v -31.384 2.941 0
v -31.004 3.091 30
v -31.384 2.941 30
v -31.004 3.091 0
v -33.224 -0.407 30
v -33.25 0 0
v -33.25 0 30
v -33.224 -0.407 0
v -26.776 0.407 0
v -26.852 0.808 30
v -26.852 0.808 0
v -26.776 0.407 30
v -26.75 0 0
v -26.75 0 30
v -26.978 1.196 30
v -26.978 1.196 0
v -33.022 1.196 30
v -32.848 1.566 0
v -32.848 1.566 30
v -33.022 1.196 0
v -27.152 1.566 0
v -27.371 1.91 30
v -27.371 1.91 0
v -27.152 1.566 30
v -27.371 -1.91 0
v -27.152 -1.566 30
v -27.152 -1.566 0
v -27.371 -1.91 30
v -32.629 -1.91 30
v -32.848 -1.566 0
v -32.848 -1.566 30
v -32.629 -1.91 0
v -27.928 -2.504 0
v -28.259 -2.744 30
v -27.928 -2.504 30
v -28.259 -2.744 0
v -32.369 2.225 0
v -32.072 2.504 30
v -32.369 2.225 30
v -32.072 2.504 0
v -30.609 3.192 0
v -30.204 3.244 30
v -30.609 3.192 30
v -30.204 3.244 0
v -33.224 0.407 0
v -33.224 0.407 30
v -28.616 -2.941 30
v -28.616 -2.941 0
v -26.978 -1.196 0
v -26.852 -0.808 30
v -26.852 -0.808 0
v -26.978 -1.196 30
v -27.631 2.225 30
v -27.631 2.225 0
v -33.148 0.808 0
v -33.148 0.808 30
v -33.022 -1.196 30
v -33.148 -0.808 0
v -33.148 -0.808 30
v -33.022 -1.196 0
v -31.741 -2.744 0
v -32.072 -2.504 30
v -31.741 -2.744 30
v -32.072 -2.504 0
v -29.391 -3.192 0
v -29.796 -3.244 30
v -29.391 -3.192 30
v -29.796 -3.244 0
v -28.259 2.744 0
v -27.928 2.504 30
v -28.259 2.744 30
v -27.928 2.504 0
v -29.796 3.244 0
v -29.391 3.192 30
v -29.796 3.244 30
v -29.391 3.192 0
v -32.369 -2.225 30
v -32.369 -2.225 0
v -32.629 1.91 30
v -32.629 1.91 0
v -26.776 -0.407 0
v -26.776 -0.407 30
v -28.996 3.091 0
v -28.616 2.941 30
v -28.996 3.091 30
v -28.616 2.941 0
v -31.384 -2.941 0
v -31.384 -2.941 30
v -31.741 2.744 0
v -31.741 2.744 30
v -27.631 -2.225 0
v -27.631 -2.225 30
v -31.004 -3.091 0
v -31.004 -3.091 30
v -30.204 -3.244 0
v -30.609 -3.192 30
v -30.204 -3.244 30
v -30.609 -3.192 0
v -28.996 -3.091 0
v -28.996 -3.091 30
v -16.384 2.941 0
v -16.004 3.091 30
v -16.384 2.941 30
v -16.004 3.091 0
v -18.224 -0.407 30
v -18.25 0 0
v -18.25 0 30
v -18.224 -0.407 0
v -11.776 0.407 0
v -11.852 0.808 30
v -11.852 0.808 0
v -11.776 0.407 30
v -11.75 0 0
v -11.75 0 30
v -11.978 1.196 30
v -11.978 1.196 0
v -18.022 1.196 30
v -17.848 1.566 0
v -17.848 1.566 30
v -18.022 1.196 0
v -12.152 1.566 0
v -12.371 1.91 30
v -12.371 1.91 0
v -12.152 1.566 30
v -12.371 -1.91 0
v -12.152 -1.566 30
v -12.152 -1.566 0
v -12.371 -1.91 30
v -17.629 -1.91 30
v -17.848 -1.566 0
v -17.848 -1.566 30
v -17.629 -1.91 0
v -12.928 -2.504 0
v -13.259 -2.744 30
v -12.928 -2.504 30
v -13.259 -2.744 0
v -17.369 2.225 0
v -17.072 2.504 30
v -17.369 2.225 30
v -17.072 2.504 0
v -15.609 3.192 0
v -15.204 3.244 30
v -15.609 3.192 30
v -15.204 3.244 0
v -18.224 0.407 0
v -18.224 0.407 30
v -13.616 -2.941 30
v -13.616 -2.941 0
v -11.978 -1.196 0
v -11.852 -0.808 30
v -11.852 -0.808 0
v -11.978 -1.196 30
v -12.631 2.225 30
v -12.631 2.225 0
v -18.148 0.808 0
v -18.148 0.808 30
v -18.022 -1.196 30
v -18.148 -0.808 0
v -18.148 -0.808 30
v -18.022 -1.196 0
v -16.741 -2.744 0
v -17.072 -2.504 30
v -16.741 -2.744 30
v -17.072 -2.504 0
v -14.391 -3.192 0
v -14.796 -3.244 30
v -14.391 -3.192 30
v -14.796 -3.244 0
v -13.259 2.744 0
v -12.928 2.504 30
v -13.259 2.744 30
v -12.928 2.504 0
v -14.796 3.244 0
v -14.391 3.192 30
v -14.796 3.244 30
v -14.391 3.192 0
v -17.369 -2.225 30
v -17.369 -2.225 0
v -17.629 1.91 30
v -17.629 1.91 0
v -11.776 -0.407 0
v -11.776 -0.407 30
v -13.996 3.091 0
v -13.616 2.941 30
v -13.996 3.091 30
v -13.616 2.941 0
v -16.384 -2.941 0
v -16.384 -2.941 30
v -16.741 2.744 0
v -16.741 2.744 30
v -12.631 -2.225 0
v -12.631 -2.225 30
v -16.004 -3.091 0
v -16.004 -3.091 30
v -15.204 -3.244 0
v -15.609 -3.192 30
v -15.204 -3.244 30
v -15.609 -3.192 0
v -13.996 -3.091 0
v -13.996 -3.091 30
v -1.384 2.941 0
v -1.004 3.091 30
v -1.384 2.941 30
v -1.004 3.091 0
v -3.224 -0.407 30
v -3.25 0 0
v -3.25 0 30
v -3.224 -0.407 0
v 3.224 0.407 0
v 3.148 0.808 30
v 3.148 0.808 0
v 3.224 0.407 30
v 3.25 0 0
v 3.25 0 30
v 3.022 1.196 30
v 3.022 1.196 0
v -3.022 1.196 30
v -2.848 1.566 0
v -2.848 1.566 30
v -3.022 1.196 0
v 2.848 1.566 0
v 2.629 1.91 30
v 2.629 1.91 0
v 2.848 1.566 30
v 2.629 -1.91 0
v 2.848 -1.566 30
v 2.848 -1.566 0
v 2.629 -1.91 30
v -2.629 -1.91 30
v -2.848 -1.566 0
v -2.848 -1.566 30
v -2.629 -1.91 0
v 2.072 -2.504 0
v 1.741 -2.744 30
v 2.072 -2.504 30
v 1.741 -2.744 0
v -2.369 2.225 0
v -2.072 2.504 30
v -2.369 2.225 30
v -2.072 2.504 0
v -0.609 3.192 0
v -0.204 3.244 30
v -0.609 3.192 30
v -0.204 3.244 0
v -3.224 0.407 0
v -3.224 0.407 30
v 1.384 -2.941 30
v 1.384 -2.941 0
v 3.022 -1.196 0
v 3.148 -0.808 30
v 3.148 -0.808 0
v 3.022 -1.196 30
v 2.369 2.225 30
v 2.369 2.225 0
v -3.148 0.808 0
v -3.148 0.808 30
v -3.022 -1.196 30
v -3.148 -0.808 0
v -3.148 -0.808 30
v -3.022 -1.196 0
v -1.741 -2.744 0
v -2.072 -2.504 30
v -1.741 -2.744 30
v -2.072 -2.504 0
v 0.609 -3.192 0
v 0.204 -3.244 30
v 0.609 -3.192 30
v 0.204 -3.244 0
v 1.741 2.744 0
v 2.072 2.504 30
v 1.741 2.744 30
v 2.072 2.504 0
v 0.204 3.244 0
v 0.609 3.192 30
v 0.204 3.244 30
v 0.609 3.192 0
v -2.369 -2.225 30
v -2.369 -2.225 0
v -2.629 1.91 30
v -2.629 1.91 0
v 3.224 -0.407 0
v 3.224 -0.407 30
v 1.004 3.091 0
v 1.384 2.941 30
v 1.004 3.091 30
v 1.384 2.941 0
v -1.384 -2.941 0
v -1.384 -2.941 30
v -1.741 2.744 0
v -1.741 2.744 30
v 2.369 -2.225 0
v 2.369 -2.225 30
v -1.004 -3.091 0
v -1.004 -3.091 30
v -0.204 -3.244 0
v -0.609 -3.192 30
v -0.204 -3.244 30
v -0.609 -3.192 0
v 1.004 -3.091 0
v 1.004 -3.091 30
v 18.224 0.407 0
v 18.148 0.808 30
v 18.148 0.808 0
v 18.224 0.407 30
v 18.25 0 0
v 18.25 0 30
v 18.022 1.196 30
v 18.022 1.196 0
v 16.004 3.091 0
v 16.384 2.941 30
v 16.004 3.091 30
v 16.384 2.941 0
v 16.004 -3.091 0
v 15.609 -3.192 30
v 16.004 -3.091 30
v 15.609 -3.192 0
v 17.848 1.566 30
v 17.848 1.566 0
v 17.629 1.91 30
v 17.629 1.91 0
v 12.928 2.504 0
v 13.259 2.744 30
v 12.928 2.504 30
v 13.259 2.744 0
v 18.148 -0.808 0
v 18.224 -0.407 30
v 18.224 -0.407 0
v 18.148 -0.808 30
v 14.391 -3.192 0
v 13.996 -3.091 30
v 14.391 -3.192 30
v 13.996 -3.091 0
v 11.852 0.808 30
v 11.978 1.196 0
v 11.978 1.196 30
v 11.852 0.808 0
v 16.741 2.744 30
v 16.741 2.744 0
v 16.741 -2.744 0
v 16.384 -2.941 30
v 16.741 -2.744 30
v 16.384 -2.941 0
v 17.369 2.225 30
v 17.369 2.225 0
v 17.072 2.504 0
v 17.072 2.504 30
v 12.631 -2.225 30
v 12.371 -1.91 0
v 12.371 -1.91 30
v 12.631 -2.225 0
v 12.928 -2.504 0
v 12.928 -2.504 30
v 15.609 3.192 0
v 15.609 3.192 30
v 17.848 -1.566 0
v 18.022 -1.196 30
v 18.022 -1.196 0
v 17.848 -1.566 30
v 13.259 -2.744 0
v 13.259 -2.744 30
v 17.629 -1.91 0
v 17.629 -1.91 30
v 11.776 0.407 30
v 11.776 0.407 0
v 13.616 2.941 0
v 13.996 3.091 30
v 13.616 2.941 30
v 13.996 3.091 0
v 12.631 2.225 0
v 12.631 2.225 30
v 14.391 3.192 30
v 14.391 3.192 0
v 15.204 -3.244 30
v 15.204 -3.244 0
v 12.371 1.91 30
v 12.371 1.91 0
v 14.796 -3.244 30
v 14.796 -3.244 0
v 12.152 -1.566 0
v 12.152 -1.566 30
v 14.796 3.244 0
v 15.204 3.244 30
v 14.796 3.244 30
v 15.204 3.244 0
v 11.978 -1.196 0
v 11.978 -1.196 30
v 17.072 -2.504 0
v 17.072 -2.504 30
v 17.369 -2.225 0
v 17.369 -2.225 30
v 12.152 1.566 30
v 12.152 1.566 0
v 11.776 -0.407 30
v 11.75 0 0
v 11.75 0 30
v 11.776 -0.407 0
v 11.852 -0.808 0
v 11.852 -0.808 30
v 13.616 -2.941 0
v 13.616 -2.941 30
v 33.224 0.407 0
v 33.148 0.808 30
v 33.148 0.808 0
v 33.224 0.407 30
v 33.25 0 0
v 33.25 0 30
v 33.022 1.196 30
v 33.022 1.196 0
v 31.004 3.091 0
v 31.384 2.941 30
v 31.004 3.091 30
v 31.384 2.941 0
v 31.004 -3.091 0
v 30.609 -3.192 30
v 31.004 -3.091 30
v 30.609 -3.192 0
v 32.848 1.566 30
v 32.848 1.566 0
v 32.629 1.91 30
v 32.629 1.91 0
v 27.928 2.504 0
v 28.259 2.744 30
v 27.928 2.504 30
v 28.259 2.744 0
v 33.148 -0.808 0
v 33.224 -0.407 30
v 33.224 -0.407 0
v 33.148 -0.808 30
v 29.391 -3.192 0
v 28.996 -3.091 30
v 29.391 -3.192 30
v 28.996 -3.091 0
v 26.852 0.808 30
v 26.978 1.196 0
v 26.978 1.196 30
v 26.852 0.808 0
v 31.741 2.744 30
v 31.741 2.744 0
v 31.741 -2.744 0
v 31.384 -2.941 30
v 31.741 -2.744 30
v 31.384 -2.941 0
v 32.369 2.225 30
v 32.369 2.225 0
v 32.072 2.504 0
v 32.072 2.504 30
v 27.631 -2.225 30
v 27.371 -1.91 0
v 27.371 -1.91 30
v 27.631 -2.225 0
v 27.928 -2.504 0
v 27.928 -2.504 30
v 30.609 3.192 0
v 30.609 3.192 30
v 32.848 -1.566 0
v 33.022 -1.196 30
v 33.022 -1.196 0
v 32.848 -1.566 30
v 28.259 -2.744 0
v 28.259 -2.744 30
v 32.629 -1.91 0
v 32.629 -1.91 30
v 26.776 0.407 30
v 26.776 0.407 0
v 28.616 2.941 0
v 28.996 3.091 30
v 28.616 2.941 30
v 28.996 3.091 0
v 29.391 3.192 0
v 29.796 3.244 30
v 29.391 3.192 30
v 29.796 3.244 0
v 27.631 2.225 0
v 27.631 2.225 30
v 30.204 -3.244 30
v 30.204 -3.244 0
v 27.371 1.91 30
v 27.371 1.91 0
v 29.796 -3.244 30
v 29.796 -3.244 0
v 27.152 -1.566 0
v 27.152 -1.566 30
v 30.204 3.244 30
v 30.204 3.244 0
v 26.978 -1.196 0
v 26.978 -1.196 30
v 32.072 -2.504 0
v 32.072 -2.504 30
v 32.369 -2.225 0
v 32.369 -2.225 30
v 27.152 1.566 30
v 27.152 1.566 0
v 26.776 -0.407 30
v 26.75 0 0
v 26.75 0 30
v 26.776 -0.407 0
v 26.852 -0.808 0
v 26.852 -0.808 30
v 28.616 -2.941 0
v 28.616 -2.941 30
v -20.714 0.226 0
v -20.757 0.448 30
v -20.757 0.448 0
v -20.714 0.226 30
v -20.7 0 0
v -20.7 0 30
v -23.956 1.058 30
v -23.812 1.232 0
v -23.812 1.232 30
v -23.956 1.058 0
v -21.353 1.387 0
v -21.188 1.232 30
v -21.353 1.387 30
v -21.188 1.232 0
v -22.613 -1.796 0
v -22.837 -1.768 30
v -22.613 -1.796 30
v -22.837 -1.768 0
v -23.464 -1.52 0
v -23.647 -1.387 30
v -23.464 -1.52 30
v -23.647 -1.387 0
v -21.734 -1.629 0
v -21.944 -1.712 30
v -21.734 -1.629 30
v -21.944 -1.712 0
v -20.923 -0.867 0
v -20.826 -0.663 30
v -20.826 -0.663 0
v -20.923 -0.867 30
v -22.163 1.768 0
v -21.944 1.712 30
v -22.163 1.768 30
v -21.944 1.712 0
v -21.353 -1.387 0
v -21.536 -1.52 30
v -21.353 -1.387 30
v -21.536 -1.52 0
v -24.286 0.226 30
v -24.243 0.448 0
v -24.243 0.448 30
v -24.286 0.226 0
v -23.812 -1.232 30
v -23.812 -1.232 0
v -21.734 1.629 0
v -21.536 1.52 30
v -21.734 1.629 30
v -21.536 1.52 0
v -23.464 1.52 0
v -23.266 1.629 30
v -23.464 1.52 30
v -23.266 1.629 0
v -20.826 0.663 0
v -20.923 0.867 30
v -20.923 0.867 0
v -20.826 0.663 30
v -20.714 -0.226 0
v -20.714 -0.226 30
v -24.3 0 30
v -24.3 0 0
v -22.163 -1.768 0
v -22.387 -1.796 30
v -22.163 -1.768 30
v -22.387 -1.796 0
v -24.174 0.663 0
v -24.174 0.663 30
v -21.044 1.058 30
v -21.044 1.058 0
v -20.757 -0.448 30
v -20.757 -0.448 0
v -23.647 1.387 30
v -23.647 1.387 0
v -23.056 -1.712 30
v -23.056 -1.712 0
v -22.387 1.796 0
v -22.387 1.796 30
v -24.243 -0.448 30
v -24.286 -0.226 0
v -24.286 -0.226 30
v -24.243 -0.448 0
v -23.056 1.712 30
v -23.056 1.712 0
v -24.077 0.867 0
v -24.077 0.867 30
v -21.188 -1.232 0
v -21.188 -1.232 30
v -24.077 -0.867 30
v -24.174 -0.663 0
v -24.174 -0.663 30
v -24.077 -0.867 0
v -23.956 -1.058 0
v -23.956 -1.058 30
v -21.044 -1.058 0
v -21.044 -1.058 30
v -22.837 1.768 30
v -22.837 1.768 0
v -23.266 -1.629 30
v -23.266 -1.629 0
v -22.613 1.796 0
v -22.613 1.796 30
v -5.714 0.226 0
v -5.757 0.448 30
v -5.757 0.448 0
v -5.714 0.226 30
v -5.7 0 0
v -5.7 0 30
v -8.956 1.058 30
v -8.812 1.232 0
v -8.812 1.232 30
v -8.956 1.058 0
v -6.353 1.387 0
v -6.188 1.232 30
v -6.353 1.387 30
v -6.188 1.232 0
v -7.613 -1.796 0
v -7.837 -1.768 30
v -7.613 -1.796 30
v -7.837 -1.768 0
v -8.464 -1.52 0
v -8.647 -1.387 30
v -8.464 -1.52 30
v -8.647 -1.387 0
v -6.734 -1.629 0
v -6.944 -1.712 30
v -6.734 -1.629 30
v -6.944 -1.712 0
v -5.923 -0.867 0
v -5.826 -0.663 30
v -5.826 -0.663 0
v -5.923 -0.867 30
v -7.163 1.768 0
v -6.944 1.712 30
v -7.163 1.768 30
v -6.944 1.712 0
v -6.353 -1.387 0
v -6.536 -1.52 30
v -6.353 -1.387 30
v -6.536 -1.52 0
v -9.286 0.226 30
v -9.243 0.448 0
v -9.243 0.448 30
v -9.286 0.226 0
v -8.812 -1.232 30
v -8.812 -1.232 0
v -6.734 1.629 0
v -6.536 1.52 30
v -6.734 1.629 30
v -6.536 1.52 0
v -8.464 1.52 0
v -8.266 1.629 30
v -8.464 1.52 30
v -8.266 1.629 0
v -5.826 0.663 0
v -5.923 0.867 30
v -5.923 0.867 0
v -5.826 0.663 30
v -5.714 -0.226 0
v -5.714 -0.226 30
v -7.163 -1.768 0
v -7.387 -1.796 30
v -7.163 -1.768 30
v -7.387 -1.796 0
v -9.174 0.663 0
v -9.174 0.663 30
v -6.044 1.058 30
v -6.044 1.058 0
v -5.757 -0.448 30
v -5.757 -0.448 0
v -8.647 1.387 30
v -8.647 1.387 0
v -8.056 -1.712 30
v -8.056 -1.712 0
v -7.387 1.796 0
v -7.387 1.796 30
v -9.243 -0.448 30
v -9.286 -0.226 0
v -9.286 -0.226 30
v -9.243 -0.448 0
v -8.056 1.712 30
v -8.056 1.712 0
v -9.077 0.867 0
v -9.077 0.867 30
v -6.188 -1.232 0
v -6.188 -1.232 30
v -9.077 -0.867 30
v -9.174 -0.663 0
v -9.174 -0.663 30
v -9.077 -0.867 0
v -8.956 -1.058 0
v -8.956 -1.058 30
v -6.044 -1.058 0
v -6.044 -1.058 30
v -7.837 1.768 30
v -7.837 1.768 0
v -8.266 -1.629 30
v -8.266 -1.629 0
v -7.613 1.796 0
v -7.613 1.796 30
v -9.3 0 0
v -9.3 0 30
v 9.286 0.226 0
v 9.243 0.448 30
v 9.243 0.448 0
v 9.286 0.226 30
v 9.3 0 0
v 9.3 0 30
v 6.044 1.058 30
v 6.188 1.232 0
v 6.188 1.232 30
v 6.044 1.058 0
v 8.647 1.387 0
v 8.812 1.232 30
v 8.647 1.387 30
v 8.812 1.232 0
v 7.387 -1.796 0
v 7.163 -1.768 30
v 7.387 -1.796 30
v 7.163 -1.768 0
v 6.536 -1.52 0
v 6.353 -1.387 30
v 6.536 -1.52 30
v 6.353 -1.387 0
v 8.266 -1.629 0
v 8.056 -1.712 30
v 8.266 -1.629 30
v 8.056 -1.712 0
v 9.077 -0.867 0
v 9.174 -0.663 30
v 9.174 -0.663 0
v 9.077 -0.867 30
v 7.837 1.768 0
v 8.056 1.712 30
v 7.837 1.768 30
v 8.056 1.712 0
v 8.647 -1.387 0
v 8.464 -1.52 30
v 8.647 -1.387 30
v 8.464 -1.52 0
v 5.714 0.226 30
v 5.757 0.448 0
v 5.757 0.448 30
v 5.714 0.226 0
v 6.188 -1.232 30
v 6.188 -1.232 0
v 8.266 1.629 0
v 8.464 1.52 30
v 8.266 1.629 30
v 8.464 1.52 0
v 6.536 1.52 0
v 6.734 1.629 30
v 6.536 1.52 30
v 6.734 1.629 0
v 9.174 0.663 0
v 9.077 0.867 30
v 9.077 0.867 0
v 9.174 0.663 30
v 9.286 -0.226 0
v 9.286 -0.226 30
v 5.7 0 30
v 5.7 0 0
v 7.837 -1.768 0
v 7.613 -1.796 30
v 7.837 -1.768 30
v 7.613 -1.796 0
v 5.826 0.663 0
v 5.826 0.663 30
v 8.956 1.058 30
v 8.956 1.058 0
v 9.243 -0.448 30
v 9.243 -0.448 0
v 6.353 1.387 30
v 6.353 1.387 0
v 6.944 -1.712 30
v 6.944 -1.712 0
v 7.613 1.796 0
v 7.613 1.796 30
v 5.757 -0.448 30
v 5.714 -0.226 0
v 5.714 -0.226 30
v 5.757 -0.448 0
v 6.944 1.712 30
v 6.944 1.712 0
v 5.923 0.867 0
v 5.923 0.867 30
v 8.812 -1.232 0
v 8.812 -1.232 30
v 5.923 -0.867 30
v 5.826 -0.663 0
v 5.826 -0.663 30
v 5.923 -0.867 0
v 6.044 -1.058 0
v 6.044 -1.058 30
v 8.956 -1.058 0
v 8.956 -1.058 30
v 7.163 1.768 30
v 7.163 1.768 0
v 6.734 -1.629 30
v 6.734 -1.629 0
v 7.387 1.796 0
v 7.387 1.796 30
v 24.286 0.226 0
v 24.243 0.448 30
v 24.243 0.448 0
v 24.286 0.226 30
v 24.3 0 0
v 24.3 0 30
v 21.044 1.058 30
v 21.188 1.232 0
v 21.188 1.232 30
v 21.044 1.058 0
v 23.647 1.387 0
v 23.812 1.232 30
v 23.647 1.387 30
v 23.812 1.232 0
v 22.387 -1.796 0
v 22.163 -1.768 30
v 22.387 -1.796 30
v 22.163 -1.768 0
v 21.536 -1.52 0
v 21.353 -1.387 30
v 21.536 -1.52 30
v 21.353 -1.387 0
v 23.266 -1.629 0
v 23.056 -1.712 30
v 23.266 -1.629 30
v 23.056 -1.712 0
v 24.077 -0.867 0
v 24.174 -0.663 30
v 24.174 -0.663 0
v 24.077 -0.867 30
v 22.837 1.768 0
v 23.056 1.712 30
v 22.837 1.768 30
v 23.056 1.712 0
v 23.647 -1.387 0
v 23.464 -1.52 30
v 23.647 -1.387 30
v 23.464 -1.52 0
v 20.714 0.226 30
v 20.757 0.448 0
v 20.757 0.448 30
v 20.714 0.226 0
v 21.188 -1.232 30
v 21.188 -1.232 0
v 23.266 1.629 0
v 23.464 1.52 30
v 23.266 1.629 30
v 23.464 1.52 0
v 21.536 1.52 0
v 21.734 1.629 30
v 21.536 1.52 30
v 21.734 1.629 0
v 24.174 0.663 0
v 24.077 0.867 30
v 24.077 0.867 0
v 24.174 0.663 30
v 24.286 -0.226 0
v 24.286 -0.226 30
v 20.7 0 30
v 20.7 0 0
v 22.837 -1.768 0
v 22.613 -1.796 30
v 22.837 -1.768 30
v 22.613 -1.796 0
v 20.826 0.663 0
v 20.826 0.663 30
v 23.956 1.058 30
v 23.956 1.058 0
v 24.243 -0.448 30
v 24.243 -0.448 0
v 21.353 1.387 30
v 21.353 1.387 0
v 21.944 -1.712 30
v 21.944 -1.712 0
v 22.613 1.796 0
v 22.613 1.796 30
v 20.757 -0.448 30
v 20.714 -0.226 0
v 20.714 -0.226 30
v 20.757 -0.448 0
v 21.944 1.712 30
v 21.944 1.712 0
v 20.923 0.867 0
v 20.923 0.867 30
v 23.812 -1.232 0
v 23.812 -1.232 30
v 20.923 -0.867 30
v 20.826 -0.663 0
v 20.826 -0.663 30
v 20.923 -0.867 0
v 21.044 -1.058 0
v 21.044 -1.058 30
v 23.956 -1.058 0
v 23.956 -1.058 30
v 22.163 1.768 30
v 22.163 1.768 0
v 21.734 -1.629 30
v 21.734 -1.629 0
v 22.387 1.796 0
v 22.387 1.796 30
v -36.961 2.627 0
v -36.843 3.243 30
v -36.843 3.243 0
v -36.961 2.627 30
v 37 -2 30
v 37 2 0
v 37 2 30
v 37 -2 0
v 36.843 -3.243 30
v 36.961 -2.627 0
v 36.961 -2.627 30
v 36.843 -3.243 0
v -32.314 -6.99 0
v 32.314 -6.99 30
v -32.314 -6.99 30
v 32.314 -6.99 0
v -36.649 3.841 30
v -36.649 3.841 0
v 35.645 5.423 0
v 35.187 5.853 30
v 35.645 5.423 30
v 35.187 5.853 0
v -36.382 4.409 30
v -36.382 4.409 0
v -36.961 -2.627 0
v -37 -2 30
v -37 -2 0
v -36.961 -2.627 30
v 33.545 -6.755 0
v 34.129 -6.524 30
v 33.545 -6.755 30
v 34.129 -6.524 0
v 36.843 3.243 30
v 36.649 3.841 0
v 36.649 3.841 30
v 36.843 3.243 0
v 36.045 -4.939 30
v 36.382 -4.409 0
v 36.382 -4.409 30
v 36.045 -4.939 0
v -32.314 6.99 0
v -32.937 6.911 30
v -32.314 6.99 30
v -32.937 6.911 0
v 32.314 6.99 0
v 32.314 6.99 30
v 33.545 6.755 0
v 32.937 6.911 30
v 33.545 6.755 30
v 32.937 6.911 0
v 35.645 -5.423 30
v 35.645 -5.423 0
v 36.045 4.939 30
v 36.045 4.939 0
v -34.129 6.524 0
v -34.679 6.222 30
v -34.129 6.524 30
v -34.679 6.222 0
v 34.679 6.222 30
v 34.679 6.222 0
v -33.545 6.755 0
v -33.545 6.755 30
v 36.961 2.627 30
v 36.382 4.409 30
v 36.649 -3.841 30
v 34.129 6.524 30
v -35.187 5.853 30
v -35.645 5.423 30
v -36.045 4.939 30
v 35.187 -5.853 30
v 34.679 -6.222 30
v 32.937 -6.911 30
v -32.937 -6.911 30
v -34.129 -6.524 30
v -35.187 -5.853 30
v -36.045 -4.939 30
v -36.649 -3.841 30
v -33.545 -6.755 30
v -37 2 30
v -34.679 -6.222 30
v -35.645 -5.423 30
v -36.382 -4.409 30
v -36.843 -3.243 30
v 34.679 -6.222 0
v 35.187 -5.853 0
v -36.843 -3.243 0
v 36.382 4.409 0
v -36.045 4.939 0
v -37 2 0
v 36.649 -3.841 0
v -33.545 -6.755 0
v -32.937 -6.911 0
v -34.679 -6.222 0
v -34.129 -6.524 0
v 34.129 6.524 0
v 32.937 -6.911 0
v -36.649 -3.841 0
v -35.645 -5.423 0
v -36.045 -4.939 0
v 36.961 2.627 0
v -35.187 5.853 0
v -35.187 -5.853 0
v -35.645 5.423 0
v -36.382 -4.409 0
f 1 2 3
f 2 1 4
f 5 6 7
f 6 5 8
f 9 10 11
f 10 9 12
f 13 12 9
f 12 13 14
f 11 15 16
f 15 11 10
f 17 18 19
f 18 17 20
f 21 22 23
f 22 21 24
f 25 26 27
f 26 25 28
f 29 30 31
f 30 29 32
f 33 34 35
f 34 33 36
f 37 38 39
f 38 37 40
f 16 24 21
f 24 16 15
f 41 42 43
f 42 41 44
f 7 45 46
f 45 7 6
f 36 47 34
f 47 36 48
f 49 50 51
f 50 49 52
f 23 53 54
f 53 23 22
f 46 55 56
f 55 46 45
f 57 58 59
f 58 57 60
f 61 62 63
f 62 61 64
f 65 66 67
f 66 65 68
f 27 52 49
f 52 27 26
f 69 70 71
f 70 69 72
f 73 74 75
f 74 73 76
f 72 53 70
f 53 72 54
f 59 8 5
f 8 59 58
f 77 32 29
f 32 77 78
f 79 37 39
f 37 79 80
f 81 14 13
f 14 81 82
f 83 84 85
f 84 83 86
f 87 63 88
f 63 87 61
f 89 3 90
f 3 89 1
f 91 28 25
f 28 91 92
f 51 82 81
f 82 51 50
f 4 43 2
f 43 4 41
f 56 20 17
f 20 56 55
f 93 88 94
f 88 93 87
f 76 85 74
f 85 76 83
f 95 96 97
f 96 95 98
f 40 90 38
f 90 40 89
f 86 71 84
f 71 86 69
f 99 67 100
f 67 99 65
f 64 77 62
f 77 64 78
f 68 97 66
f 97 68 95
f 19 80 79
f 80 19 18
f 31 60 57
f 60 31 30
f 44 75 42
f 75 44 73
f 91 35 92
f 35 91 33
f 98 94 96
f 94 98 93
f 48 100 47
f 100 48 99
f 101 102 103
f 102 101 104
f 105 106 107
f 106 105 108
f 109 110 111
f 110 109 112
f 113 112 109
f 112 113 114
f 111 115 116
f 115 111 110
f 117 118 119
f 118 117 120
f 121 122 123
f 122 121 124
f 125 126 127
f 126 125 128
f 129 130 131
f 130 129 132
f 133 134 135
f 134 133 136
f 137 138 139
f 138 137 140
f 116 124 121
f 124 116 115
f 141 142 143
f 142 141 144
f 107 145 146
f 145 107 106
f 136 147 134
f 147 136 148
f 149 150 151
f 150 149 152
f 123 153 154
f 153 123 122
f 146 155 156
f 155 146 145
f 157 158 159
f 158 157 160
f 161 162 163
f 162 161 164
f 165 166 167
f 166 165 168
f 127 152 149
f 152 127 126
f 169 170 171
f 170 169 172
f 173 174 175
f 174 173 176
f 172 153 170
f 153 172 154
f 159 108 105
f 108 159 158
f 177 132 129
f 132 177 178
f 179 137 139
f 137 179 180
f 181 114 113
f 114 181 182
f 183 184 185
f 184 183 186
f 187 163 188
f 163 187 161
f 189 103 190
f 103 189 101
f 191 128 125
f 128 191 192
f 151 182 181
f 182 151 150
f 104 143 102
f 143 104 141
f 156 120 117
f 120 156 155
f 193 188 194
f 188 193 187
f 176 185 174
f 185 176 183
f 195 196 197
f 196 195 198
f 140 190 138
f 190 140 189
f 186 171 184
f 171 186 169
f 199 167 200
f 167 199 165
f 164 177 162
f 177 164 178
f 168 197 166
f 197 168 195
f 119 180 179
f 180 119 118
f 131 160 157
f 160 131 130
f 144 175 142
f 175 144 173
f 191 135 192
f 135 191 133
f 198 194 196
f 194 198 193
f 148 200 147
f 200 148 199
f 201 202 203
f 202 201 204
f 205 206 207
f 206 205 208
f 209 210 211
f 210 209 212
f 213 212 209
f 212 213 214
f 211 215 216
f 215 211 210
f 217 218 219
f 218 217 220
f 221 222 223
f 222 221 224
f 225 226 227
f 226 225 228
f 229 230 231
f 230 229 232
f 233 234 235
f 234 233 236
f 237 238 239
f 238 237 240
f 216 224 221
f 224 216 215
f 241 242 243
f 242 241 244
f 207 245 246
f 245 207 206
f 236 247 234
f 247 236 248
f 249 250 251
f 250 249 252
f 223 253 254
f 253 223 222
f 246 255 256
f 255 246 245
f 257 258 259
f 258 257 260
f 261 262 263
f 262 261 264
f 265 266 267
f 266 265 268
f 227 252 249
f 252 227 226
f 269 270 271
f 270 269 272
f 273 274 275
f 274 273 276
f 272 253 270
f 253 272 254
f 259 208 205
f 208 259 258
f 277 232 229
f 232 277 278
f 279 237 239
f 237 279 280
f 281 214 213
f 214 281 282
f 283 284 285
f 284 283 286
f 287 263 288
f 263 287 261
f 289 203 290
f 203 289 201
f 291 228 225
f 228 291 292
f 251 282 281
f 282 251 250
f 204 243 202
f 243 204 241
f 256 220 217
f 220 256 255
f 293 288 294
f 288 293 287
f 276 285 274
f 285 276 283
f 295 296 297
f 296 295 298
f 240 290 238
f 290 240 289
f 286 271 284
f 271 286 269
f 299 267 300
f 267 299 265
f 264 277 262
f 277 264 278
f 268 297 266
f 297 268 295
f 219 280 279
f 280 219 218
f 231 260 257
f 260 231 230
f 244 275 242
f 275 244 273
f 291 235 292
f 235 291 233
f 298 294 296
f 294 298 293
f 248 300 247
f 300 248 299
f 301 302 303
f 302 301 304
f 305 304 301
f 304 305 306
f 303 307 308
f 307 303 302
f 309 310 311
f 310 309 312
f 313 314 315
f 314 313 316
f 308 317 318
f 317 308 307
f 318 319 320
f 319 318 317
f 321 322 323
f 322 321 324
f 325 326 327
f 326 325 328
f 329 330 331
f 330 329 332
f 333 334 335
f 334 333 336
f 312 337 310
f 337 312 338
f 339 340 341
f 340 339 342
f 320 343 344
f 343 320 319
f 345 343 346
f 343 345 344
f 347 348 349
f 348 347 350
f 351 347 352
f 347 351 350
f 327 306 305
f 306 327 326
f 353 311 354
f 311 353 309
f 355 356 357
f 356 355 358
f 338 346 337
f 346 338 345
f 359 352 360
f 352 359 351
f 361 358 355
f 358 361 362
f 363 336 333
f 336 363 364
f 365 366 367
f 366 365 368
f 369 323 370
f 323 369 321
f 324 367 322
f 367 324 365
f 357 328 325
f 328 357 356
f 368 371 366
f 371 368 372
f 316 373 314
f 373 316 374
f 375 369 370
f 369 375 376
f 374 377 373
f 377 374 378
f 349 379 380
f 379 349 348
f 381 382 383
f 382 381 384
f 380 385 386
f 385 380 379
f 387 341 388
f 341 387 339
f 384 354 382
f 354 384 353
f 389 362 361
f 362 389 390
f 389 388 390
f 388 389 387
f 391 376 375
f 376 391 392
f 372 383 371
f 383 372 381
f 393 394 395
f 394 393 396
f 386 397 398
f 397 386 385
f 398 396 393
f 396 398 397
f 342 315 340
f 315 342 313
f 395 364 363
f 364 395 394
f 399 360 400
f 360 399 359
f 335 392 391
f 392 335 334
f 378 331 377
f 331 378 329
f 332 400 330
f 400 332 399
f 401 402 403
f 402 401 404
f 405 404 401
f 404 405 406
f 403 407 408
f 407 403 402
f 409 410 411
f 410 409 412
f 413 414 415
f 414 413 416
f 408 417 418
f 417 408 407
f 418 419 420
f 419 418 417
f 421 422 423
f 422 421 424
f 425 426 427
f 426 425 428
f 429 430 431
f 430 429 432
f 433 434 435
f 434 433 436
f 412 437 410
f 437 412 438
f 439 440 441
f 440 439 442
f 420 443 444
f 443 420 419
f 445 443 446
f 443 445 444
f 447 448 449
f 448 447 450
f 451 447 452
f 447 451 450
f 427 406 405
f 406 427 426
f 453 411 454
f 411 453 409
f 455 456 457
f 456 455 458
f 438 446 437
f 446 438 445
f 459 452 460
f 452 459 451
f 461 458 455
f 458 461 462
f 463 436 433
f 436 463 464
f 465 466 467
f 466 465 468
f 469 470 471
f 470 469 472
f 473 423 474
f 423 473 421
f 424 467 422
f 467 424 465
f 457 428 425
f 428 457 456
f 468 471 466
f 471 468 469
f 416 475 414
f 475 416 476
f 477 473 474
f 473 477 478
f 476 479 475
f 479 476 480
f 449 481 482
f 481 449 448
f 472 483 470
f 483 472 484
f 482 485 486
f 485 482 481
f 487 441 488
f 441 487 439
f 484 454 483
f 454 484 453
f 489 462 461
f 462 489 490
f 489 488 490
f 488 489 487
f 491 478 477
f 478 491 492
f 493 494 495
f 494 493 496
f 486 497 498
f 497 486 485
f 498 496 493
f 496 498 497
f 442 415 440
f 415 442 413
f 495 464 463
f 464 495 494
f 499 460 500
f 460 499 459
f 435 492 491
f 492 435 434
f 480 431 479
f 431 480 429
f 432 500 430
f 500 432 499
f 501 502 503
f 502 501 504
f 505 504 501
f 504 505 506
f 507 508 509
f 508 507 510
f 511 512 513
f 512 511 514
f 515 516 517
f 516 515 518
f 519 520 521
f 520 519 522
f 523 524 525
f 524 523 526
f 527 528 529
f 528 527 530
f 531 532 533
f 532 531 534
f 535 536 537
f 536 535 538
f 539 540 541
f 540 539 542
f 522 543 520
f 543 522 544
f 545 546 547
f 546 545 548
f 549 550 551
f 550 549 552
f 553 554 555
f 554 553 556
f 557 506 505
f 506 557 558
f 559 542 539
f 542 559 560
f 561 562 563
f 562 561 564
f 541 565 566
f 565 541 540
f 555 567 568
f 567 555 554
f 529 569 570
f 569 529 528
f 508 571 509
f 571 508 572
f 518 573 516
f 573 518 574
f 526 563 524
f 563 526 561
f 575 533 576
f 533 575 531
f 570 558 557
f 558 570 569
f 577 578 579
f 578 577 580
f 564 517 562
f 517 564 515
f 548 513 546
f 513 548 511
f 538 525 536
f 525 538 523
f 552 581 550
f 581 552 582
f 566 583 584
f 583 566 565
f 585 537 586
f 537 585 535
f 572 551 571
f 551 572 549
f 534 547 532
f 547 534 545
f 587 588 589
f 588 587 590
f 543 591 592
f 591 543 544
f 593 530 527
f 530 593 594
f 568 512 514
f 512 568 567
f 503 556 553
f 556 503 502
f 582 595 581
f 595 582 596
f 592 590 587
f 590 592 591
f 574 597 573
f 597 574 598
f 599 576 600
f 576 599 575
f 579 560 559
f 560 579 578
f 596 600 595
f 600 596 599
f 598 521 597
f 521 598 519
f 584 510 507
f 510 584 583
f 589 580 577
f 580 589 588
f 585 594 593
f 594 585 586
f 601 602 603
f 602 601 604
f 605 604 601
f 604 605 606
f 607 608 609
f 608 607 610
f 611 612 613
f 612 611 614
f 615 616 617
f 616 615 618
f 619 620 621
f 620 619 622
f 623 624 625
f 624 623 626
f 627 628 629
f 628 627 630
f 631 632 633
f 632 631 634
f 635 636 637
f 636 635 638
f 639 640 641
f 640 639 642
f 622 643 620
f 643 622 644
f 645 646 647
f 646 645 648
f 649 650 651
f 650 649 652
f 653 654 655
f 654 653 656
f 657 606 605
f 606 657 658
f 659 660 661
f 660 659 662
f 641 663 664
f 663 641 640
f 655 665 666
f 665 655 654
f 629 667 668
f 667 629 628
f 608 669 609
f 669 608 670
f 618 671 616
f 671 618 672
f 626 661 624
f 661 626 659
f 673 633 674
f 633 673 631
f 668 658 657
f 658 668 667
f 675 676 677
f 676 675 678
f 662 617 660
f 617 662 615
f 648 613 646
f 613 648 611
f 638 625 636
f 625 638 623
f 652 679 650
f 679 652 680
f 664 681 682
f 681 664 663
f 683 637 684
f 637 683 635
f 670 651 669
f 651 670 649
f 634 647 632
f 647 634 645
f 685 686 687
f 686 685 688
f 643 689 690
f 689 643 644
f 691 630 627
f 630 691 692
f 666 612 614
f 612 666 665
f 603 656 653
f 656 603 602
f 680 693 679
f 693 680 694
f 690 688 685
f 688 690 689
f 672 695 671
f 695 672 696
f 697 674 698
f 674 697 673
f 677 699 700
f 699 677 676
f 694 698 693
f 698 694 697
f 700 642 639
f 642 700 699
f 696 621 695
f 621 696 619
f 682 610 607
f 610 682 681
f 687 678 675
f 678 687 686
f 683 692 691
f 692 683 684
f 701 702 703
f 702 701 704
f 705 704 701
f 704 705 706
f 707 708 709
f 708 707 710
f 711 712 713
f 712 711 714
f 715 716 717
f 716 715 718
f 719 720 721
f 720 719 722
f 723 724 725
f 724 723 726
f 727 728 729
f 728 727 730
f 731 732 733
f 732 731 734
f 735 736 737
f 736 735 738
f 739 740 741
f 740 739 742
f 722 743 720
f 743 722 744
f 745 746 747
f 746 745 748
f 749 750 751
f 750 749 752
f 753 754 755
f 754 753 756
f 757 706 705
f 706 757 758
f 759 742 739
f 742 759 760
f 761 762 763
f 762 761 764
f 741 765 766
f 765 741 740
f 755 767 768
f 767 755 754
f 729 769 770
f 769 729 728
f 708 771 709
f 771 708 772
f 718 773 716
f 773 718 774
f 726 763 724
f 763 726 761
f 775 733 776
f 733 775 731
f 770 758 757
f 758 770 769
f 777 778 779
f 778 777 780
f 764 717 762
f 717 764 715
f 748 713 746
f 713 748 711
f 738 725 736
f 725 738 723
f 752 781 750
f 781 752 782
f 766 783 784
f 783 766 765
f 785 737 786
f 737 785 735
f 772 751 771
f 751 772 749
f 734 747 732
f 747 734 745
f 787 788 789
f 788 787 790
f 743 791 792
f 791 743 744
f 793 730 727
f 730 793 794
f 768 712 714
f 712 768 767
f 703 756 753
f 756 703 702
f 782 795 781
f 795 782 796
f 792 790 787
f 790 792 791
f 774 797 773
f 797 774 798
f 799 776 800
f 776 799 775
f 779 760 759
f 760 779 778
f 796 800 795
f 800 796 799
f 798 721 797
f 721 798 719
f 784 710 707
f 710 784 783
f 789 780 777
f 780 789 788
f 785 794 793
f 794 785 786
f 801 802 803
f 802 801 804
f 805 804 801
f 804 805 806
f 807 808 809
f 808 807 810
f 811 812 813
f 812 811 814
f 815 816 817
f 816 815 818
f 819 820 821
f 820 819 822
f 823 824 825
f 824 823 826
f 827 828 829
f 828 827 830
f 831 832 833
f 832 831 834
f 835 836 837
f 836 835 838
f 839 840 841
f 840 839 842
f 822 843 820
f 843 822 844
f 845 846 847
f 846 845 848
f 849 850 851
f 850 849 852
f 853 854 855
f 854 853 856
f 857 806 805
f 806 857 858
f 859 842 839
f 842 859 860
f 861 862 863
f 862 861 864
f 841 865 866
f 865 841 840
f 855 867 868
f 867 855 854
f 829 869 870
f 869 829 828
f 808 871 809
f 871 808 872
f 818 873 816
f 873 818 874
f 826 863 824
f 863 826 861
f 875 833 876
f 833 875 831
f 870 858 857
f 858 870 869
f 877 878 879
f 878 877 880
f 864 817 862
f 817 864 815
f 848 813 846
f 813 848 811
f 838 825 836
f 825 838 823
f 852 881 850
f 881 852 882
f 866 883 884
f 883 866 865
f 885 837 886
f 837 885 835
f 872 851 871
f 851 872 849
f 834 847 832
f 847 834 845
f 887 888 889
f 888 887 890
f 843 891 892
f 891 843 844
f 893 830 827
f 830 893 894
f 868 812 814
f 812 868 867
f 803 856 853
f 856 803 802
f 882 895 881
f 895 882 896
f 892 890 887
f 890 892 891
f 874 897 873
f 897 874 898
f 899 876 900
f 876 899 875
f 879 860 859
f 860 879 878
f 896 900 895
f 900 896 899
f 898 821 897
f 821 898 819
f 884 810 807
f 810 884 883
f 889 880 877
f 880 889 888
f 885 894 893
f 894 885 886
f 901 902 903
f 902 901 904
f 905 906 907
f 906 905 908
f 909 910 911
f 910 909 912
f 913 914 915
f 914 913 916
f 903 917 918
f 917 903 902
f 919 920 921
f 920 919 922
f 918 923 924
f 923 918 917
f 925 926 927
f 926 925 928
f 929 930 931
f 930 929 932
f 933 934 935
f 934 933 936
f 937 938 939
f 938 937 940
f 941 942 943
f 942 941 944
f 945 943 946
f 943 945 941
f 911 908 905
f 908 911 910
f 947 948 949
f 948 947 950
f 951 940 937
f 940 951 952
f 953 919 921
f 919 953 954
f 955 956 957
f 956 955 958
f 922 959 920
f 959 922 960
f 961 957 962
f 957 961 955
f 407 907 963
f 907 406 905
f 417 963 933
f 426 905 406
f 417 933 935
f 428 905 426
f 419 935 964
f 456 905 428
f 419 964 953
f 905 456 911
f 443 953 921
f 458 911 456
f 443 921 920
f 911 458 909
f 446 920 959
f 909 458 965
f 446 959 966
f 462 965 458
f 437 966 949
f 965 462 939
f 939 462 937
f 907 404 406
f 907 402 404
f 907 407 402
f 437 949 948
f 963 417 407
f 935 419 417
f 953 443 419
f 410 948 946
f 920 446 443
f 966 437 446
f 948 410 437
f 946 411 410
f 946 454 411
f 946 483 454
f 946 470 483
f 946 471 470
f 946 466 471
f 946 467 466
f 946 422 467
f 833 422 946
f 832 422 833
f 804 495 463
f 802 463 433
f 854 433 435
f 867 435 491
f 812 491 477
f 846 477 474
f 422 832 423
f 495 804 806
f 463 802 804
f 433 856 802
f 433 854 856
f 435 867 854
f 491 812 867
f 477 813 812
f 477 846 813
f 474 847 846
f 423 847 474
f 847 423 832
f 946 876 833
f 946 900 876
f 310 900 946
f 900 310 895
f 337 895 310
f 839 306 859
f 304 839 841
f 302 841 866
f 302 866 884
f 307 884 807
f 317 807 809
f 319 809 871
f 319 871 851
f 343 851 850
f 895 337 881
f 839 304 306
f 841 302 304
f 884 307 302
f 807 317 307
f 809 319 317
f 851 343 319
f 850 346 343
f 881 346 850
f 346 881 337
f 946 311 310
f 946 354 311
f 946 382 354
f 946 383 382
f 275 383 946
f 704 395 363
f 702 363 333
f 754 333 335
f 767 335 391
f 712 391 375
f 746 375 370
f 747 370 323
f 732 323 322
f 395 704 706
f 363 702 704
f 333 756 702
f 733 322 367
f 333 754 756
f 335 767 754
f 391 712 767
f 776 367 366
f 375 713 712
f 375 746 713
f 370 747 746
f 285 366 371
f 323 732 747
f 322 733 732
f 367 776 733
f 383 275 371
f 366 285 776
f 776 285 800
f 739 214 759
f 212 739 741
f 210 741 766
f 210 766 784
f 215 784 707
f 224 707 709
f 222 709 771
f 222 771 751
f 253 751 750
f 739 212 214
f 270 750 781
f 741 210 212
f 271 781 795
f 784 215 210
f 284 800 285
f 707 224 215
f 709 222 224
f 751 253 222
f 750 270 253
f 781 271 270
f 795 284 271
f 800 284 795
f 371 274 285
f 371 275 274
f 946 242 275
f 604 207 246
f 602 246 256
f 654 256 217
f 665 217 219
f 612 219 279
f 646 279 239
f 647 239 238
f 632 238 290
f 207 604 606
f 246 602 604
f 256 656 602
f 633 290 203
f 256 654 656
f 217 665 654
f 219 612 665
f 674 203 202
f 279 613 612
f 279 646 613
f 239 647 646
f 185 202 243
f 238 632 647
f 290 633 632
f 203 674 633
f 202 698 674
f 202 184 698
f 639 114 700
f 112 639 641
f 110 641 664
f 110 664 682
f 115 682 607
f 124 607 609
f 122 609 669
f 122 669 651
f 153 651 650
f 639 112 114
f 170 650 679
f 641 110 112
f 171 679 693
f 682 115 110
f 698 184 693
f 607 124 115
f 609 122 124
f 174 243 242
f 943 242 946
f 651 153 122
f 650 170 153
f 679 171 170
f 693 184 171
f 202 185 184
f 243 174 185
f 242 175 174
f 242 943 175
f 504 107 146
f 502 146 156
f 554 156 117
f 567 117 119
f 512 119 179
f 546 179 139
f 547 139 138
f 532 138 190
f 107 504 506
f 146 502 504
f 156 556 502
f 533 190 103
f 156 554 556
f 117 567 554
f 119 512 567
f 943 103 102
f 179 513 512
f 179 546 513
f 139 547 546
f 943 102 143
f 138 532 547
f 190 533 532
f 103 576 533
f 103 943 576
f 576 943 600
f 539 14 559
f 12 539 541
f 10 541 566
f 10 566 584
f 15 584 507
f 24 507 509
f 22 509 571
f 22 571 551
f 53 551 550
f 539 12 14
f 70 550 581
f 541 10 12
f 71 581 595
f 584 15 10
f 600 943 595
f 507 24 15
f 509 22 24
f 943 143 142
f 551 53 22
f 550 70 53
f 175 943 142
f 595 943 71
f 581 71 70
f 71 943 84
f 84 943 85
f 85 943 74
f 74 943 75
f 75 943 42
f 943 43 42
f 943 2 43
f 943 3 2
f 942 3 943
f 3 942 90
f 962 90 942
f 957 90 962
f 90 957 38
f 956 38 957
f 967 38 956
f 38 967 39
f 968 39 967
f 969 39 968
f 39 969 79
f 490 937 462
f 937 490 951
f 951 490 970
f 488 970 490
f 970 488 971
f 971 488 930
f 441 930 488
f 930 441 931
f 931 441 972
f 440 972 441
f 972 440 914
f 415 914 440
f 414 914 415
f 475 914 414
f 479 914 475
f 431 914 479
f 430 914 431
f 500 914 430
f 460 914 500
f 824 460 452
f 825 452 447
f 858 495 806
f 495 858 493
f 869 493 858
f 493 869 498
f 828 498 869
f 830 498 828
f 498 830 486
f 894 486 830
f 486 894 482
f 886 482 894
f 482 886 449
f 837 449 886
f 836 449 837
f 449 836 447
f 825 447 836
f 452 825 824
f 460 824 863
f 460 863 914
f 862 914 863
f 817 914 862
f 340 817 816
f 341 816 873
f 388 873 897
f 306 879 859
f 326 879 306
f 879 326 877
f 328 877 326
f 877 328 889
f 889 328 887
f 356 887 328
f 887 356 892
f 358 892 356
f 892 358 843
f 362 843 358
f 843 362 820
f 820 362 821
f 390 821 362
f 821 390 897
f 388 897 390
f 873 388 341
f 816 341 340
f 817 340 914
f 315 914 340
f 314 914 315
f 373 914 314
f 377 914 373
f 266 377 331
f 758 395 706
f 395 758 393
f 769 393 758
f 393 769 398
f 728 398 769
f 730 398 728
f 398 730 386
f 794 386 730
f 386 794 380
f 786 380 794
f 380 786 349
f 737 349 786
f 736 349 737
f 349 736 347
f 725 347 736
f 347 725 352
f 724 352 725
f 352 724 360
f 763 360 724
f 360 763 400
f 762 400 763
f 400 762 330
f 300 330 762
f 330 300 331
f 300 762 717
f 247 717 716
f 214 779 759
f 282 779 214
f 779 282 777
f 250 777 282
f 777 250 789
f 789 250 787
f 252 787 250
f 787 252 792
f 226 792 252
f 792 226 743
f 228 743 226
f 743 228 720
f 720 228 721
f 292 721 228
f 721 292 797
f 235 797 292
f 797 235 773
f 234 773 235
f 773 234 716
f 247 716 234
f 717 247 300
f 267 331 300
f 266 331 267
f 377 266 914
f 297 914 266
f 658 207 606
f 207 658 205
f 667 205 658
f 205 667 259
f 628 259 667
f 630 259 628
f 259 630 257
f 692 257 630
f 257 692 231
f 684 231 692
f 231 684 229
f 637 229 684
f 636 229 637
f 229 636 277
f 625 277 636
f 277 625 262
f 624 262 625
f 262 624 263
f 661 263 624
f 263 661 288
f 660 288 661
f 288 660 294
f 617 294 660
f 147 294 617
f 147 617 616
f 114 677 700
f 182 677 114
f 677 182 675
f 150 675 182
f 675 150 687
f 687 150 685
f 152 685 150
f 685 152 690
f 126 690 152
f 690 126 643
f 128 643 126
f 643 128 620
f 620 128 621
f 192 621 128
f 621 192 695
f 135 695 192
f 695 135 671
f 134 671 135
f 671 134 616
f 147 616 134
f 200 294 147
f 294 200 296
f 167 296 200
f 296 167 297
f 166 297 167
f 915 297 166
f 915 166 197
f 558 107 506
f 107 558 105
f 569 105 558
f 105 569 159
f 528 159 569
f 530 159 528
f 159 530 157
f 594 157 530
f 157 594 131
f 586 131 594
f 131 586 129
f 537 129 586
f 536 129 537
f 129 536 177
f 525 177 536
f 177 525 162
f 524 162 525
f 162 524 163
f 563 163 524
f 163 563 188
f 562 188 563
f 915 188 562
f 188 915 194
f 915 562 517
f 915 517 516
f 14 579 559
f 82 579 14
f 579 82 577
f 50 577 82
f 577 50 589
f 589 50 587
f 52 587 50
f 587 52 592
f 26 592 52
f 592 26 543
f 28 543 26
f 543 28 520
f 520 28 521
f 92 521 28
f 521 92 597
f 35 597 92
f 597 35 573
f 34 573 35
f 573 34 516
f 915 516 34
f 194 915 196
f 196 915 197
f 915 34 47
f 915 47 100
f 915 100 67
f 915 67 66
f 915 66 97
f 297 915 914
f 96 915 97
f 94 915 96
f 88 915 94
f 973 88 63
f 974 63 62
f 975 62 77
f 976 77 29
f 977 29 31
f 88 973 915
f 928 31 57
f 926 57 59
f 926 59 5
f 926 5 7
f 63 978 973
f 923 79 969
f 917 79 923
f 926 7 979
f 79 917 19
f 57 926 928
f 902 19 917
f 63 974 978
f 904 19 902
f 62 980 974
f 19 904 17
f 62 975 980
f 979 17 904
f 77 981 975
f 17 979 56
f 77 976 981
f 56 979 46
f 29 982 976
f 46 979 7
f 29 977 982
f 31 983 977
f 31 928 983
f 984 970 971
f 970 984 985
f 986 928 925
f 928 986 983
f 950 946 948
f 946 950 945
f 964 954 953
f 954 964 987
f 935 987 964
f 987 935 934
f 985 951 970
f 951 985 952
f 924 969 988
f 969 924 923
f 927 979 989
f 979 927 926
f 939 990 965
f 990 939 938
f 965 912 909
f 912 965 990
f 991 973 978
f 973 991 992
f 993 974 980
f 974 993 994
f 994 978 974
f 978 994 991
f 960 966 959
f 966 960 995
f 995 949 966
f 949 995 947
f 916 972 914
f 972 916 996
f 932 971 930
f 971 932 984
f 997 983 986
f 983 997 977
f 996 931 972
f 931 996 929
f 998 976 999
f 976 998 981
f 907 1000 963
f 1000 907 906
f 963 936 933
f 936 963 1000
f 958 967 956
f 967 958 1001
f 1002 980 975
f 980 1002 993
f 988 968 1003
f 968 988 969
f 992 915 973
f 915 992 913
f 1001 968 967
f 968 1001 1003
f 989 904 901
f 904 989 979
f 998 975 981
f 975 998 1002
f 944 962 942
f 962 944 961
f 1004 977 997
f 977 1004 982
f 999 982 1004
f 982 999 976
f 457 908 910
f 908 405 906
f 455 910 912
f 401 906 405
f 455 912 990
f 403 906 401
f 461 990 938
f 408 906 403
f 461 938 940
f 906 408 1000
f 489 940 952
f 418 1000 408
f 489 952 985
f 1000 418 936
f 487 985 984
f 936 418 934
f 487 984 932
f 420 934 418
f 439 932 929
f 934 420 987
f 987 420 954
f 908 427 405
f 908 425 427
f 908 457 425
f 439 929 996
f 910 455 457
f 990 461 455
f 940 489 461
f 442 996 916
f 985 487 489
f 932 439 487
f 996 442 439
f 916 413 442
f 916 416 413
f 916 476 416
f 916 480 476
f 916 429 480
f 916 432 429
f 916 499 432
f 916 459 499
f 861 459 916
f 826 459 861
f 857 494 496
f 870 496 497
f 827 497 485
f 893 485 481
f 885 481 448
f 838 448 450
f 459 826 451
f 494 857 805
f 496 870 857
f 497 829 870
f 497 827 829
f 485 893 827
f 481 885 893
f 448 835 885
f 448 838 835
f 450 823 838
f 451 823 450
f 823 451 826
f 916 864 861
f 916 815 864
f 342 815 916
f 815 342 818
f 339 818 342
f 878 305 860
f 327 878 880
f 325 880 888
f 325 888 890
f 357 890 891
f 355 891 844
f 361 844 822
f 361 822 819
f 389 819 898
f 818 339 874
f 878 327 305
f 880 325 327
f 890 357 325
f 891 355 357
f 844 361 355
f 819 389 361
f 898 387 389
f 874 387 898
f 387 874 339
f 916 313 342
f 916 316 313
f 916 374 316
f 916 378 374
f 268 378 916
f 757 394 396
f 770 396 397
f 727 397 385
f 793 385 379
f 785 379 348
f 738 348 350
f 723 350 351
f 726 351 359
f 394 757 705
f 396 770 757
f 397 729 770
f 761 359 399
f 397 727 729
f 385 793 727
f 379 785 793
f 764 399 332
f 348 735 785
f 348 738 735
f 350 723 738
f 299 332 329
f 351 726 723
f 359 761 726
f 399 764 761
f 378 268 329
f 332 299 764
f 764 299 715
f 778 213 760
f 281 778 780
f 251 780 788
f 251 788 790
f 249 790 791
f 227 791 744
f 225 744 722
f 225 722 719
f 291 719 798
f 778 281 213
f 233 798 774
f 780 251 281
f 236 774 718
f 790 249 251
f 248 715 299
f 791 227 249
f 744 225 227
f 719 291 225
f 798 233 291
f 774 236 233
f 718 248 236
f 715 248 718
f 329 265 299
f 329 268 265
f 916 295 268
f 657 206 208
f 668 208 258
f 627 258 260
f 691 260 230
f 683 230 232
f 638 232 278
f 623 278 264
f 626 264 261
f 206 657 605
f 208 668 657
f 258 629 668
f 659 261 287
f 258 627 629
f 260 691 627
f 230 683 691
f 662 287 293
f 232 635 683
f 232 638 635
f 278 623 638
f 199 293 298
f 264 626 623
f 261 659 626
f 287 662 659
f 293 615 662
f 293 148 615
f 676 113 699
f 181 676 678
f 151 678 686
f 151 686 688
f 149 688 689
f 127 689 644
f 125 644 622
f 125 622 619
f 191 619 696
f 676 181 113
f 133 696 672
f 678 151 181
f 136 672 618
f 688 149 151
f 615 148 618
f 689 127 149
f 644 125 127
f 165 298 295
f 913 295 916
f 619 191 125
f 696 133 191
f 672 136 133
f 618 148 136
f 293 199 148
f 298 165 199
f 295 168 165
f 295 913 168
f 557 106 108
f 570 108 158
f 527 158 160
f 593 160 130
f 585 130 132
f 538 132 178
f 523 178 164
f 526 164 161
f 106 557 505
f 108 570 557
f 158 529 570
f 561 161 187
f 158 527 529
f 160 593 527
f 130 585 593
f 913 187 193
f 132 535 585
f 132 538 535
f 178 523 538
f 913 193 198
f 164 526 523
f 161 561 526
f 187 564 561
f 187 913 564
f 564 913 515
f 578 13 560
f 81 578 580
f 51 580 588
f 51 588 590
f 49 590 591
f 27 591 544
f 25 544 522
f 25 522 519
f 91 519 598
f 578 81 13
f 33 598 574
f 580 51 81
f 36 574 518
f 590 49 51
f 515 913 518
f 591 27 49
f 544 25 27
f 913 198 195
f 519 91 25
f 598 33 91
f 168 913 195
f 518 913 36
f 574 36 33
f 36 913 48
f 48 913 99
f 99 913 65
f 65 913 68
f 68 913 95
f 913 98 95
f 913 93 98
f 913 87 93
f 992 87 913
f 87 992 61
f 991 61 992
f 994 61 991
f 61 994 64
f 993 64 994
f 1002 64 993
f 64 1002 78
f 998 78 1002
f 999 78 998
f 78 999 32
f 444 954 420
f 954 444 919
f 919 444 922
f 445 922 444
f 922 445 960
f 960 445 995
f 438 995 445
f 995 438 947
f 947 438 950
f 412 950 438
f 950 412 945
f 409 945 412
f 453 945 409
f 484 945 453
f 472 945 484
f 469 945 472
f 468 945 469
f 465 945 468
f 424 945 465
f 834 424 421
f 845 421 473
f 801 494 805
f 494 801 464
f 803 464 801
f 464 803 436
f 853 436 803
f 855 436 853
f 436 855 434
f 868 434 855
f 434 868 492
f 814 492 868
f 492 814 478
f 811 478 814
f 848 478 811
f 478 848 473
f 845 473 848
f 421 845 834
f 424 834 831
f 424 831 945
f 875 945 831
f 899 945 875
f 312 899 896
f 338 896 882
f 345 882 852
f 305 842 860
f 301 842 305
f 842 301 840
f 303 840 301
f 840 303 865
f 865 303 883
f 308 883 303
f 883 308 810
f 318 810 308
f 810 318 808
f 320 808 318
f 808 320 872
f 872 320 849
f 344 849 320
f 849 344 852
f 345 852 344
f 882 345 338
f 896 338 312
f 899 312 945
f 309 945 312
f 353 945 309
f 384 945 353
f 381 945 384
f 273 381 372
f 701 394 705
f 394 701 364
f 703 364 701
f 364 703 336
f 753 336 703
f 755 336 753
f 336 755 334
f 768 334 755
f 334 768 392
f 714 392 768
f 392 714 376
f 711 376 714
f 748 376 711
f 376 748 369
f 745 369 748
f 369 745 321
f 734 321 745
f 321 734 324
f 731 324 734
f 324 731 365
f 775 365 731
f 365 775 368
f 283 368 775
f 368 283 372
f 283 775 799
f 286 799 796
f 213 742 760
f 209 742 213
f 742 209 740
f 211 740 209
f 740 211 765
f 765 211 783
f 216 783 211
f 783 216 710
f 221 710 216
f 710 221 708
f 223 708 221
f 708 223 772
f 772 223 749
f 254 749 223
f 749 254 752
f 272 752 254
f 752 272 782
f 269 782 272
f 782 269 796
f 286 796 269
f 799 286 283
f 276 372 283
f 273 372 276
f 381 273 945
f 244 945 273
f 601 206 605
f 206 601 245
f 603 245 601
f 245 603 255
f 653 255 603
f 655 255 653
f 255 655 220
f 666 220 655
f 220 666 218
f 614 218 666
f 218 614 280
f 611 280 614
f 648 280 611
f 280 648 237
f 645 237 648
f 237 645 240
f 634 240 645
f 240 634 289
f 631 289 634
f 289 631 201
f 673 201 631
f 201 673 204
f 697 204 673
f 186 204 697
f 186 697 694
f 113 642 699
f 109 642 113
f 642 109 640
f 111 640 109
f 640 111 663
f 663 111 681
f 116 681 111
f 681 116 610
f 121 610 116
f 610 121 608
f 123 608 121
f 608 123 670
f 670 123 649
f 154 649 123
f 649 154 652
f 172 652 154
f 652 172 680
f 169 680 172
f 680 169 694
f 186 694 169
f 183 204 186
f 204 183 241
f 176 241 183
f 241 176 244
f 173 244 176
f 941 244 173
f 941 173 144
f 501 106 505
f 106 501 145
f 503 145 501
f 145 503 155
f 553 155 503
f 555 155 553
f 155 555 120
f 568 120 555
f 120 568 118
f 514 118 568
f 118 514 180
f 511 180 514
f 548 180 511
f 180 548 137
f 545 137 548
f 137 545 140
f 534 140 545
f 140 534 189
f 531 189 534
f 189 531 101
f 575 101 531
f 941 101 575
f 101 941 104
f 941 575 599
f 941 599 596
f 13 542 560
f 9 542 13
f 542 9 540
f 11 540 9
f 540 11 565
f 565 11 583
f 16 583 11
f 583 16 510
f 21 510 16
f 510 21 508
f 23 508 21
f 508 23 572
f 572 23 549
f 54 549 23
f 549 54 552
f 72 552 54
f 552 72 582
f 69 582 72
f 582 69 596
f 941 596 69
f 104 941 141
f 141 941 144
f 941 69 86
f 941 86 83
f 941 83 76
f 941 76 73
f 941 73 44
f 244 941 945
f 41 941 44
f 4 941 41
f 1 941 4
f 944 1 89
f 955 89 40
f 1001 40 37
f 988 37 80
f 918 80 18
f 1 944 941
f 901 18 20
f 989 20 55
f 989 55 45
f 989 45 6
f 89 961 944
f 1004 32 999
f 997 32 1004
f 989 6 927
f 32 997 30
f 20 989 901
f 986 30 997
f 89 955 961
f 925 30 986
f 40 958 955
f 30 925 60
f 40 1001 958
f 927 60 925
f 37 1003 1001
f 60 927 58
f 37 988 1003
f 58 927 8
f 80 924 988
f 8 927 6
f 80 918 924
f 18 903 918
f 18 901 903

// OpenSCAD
$fn = 50;


difference() {
	union() {
		*color(alpha = 1.0000000000, c = "gray") {
			translate(v = [0, 7, 0]) {
				linear_extrude(height = 1) {
					text(font = "Arial:style=Bold", halign = "center", size = 4.5000000000, text = "COMMENT plate main", valign = "center");
				}
			}
		}
		*color(alpha = 1.0000000000, c = "gray") {
			translate(v = [0, 14, 0]) {
				linear_extrude(height = 1) {
					text(font = "Arial:style=Bold", halign = "center", size = 4.5000000000, text = "COMMENT description oobb_plate_shape_p_type_30_depth_5_width_1_height_30_thickness_true_both_holes", valign = "center");
				}
			}
		}
		hull() {
			translate(v = [-32.0000000000, 2.0000000000, 0]) {
				cylinder(h = 30, r = 5);
			}
			translate(v = [32.0000000000, 2.0000000000, 0]) {
				cylinder(h = 30, r = 5);
			}
			translate(v = [-32.0000000000, -2.0000000000, 0]) {
				cylinder(h = 30, r = 5);
			}
			translate(v = [32.0000000000, -2.0000000000, 0]) {
				cylinder(h = 30, r = 5);
			}
		}
	}
	union() {
		*color(alpha = 1.0000000000, c = "gray") {
			translate(v = [0, 7, 0]) {
				linear_extrude(height = 1) {
					text(font = "Arial:style=Bold", halign = "center", size = 4.5000000000, text = "COMMENT holes main", valign = "center");
				}
			}
		}
		*color(alpha = 1.0000000000, c = "gray") {
			translate(v = [0, 14, 0]) {
				linear_extrude(height = 1) {
					text(font = "Arial:style=Bold", halign = "center", size = 4.5000000000, text = "COMMENT description oobb_holes_shape_n_type_5_width_1_height_30_thickness_true_both_holes", valign = "center");
				}
			}
		}
		translate(v = [-30.0000000000, 0.0000000000, 0]) {
			translate(v = [0, 0, -50]) {
				cylinder(h = 100, r = 3.2500000000);
			}
		}
		translate(v = [-15.0000000000, 0.0000000000, 0]) {
			translate(v = [0, 0, -50]) {
				cylinder(h = 100, r = 3.2500000000);
			}
		}
		translate(v = [0, 0, -50]) {
			cylinder(h = 100, r = 3.2500000000);
		}
		translate(v = [15.0000000000, 0.0000000000, 0]) {
			translate(v = [0, 0, -50]) {
				cylinder(h = 100, r = 3.2500000000);
			}
		}
		translate(v = [30.0000000000, 0.0000000000, 0]) {
			translate(v = [0, 0, -50]) {
				cylinder(h = 100, r = 3.2500000000);
			}
		}
		translate(v = [-30.0000000000, 0.0000000000, 0]) {
			translate(v = [0, 0, -50]) {
				cylinder(h = 100, r = 1.8000000000);
			}
		}
		translate(v = [-22.5000000000, 0.0000000000, 0]) {
			translate(v = [0, 0, -50]) {
				cylinder(h = 100, r = 1.8000000000);
			}
		}
		translate(v = [-15.0000000000, 0.0000000000, 0]) {
			translate(v = [0, 0, -50]) {
				cylinder(h = 100, r = 1.8000000000);
			}
		}
		translate(v = [-7.5000000000, 0.0000000000, 0]) {
			translate(v = [0, 0, -50]) {
				cylinder(h = 100, r = 1.8000000000);
			}
		}
		translate(v = [0, 0, -50]) {
			cylinder(h = 100, r = 1.8000000000);
		}
		translate(v = [7.5000000000, 0.0000000000, 0]) {
			translate(v = [0, 0, -50]) {
				cylinder(h = 100, r = 1.8000000000);
			}
		}
		translate(v = [15.0000000000, 0.0000000000, 0]) {
			translate(v = [0, 0, -50]) {
				cylinder(h = 100, r = 1.8000000000);
			}
		}
		translate(v = [22.5000000000, 0.0000000000, 0]) {
			translate(v = [0, 0, -50]) {
				cylinder(h = 100, r = 1.8000000000);
			}
		}
		translate(v = [30.0000000000, 0.0000000000, 0]) {
			translate(v = [0, 0, -50]) {
				cylinder(h = 100, r = 1.8000000000);
			}
		}
	}
}
